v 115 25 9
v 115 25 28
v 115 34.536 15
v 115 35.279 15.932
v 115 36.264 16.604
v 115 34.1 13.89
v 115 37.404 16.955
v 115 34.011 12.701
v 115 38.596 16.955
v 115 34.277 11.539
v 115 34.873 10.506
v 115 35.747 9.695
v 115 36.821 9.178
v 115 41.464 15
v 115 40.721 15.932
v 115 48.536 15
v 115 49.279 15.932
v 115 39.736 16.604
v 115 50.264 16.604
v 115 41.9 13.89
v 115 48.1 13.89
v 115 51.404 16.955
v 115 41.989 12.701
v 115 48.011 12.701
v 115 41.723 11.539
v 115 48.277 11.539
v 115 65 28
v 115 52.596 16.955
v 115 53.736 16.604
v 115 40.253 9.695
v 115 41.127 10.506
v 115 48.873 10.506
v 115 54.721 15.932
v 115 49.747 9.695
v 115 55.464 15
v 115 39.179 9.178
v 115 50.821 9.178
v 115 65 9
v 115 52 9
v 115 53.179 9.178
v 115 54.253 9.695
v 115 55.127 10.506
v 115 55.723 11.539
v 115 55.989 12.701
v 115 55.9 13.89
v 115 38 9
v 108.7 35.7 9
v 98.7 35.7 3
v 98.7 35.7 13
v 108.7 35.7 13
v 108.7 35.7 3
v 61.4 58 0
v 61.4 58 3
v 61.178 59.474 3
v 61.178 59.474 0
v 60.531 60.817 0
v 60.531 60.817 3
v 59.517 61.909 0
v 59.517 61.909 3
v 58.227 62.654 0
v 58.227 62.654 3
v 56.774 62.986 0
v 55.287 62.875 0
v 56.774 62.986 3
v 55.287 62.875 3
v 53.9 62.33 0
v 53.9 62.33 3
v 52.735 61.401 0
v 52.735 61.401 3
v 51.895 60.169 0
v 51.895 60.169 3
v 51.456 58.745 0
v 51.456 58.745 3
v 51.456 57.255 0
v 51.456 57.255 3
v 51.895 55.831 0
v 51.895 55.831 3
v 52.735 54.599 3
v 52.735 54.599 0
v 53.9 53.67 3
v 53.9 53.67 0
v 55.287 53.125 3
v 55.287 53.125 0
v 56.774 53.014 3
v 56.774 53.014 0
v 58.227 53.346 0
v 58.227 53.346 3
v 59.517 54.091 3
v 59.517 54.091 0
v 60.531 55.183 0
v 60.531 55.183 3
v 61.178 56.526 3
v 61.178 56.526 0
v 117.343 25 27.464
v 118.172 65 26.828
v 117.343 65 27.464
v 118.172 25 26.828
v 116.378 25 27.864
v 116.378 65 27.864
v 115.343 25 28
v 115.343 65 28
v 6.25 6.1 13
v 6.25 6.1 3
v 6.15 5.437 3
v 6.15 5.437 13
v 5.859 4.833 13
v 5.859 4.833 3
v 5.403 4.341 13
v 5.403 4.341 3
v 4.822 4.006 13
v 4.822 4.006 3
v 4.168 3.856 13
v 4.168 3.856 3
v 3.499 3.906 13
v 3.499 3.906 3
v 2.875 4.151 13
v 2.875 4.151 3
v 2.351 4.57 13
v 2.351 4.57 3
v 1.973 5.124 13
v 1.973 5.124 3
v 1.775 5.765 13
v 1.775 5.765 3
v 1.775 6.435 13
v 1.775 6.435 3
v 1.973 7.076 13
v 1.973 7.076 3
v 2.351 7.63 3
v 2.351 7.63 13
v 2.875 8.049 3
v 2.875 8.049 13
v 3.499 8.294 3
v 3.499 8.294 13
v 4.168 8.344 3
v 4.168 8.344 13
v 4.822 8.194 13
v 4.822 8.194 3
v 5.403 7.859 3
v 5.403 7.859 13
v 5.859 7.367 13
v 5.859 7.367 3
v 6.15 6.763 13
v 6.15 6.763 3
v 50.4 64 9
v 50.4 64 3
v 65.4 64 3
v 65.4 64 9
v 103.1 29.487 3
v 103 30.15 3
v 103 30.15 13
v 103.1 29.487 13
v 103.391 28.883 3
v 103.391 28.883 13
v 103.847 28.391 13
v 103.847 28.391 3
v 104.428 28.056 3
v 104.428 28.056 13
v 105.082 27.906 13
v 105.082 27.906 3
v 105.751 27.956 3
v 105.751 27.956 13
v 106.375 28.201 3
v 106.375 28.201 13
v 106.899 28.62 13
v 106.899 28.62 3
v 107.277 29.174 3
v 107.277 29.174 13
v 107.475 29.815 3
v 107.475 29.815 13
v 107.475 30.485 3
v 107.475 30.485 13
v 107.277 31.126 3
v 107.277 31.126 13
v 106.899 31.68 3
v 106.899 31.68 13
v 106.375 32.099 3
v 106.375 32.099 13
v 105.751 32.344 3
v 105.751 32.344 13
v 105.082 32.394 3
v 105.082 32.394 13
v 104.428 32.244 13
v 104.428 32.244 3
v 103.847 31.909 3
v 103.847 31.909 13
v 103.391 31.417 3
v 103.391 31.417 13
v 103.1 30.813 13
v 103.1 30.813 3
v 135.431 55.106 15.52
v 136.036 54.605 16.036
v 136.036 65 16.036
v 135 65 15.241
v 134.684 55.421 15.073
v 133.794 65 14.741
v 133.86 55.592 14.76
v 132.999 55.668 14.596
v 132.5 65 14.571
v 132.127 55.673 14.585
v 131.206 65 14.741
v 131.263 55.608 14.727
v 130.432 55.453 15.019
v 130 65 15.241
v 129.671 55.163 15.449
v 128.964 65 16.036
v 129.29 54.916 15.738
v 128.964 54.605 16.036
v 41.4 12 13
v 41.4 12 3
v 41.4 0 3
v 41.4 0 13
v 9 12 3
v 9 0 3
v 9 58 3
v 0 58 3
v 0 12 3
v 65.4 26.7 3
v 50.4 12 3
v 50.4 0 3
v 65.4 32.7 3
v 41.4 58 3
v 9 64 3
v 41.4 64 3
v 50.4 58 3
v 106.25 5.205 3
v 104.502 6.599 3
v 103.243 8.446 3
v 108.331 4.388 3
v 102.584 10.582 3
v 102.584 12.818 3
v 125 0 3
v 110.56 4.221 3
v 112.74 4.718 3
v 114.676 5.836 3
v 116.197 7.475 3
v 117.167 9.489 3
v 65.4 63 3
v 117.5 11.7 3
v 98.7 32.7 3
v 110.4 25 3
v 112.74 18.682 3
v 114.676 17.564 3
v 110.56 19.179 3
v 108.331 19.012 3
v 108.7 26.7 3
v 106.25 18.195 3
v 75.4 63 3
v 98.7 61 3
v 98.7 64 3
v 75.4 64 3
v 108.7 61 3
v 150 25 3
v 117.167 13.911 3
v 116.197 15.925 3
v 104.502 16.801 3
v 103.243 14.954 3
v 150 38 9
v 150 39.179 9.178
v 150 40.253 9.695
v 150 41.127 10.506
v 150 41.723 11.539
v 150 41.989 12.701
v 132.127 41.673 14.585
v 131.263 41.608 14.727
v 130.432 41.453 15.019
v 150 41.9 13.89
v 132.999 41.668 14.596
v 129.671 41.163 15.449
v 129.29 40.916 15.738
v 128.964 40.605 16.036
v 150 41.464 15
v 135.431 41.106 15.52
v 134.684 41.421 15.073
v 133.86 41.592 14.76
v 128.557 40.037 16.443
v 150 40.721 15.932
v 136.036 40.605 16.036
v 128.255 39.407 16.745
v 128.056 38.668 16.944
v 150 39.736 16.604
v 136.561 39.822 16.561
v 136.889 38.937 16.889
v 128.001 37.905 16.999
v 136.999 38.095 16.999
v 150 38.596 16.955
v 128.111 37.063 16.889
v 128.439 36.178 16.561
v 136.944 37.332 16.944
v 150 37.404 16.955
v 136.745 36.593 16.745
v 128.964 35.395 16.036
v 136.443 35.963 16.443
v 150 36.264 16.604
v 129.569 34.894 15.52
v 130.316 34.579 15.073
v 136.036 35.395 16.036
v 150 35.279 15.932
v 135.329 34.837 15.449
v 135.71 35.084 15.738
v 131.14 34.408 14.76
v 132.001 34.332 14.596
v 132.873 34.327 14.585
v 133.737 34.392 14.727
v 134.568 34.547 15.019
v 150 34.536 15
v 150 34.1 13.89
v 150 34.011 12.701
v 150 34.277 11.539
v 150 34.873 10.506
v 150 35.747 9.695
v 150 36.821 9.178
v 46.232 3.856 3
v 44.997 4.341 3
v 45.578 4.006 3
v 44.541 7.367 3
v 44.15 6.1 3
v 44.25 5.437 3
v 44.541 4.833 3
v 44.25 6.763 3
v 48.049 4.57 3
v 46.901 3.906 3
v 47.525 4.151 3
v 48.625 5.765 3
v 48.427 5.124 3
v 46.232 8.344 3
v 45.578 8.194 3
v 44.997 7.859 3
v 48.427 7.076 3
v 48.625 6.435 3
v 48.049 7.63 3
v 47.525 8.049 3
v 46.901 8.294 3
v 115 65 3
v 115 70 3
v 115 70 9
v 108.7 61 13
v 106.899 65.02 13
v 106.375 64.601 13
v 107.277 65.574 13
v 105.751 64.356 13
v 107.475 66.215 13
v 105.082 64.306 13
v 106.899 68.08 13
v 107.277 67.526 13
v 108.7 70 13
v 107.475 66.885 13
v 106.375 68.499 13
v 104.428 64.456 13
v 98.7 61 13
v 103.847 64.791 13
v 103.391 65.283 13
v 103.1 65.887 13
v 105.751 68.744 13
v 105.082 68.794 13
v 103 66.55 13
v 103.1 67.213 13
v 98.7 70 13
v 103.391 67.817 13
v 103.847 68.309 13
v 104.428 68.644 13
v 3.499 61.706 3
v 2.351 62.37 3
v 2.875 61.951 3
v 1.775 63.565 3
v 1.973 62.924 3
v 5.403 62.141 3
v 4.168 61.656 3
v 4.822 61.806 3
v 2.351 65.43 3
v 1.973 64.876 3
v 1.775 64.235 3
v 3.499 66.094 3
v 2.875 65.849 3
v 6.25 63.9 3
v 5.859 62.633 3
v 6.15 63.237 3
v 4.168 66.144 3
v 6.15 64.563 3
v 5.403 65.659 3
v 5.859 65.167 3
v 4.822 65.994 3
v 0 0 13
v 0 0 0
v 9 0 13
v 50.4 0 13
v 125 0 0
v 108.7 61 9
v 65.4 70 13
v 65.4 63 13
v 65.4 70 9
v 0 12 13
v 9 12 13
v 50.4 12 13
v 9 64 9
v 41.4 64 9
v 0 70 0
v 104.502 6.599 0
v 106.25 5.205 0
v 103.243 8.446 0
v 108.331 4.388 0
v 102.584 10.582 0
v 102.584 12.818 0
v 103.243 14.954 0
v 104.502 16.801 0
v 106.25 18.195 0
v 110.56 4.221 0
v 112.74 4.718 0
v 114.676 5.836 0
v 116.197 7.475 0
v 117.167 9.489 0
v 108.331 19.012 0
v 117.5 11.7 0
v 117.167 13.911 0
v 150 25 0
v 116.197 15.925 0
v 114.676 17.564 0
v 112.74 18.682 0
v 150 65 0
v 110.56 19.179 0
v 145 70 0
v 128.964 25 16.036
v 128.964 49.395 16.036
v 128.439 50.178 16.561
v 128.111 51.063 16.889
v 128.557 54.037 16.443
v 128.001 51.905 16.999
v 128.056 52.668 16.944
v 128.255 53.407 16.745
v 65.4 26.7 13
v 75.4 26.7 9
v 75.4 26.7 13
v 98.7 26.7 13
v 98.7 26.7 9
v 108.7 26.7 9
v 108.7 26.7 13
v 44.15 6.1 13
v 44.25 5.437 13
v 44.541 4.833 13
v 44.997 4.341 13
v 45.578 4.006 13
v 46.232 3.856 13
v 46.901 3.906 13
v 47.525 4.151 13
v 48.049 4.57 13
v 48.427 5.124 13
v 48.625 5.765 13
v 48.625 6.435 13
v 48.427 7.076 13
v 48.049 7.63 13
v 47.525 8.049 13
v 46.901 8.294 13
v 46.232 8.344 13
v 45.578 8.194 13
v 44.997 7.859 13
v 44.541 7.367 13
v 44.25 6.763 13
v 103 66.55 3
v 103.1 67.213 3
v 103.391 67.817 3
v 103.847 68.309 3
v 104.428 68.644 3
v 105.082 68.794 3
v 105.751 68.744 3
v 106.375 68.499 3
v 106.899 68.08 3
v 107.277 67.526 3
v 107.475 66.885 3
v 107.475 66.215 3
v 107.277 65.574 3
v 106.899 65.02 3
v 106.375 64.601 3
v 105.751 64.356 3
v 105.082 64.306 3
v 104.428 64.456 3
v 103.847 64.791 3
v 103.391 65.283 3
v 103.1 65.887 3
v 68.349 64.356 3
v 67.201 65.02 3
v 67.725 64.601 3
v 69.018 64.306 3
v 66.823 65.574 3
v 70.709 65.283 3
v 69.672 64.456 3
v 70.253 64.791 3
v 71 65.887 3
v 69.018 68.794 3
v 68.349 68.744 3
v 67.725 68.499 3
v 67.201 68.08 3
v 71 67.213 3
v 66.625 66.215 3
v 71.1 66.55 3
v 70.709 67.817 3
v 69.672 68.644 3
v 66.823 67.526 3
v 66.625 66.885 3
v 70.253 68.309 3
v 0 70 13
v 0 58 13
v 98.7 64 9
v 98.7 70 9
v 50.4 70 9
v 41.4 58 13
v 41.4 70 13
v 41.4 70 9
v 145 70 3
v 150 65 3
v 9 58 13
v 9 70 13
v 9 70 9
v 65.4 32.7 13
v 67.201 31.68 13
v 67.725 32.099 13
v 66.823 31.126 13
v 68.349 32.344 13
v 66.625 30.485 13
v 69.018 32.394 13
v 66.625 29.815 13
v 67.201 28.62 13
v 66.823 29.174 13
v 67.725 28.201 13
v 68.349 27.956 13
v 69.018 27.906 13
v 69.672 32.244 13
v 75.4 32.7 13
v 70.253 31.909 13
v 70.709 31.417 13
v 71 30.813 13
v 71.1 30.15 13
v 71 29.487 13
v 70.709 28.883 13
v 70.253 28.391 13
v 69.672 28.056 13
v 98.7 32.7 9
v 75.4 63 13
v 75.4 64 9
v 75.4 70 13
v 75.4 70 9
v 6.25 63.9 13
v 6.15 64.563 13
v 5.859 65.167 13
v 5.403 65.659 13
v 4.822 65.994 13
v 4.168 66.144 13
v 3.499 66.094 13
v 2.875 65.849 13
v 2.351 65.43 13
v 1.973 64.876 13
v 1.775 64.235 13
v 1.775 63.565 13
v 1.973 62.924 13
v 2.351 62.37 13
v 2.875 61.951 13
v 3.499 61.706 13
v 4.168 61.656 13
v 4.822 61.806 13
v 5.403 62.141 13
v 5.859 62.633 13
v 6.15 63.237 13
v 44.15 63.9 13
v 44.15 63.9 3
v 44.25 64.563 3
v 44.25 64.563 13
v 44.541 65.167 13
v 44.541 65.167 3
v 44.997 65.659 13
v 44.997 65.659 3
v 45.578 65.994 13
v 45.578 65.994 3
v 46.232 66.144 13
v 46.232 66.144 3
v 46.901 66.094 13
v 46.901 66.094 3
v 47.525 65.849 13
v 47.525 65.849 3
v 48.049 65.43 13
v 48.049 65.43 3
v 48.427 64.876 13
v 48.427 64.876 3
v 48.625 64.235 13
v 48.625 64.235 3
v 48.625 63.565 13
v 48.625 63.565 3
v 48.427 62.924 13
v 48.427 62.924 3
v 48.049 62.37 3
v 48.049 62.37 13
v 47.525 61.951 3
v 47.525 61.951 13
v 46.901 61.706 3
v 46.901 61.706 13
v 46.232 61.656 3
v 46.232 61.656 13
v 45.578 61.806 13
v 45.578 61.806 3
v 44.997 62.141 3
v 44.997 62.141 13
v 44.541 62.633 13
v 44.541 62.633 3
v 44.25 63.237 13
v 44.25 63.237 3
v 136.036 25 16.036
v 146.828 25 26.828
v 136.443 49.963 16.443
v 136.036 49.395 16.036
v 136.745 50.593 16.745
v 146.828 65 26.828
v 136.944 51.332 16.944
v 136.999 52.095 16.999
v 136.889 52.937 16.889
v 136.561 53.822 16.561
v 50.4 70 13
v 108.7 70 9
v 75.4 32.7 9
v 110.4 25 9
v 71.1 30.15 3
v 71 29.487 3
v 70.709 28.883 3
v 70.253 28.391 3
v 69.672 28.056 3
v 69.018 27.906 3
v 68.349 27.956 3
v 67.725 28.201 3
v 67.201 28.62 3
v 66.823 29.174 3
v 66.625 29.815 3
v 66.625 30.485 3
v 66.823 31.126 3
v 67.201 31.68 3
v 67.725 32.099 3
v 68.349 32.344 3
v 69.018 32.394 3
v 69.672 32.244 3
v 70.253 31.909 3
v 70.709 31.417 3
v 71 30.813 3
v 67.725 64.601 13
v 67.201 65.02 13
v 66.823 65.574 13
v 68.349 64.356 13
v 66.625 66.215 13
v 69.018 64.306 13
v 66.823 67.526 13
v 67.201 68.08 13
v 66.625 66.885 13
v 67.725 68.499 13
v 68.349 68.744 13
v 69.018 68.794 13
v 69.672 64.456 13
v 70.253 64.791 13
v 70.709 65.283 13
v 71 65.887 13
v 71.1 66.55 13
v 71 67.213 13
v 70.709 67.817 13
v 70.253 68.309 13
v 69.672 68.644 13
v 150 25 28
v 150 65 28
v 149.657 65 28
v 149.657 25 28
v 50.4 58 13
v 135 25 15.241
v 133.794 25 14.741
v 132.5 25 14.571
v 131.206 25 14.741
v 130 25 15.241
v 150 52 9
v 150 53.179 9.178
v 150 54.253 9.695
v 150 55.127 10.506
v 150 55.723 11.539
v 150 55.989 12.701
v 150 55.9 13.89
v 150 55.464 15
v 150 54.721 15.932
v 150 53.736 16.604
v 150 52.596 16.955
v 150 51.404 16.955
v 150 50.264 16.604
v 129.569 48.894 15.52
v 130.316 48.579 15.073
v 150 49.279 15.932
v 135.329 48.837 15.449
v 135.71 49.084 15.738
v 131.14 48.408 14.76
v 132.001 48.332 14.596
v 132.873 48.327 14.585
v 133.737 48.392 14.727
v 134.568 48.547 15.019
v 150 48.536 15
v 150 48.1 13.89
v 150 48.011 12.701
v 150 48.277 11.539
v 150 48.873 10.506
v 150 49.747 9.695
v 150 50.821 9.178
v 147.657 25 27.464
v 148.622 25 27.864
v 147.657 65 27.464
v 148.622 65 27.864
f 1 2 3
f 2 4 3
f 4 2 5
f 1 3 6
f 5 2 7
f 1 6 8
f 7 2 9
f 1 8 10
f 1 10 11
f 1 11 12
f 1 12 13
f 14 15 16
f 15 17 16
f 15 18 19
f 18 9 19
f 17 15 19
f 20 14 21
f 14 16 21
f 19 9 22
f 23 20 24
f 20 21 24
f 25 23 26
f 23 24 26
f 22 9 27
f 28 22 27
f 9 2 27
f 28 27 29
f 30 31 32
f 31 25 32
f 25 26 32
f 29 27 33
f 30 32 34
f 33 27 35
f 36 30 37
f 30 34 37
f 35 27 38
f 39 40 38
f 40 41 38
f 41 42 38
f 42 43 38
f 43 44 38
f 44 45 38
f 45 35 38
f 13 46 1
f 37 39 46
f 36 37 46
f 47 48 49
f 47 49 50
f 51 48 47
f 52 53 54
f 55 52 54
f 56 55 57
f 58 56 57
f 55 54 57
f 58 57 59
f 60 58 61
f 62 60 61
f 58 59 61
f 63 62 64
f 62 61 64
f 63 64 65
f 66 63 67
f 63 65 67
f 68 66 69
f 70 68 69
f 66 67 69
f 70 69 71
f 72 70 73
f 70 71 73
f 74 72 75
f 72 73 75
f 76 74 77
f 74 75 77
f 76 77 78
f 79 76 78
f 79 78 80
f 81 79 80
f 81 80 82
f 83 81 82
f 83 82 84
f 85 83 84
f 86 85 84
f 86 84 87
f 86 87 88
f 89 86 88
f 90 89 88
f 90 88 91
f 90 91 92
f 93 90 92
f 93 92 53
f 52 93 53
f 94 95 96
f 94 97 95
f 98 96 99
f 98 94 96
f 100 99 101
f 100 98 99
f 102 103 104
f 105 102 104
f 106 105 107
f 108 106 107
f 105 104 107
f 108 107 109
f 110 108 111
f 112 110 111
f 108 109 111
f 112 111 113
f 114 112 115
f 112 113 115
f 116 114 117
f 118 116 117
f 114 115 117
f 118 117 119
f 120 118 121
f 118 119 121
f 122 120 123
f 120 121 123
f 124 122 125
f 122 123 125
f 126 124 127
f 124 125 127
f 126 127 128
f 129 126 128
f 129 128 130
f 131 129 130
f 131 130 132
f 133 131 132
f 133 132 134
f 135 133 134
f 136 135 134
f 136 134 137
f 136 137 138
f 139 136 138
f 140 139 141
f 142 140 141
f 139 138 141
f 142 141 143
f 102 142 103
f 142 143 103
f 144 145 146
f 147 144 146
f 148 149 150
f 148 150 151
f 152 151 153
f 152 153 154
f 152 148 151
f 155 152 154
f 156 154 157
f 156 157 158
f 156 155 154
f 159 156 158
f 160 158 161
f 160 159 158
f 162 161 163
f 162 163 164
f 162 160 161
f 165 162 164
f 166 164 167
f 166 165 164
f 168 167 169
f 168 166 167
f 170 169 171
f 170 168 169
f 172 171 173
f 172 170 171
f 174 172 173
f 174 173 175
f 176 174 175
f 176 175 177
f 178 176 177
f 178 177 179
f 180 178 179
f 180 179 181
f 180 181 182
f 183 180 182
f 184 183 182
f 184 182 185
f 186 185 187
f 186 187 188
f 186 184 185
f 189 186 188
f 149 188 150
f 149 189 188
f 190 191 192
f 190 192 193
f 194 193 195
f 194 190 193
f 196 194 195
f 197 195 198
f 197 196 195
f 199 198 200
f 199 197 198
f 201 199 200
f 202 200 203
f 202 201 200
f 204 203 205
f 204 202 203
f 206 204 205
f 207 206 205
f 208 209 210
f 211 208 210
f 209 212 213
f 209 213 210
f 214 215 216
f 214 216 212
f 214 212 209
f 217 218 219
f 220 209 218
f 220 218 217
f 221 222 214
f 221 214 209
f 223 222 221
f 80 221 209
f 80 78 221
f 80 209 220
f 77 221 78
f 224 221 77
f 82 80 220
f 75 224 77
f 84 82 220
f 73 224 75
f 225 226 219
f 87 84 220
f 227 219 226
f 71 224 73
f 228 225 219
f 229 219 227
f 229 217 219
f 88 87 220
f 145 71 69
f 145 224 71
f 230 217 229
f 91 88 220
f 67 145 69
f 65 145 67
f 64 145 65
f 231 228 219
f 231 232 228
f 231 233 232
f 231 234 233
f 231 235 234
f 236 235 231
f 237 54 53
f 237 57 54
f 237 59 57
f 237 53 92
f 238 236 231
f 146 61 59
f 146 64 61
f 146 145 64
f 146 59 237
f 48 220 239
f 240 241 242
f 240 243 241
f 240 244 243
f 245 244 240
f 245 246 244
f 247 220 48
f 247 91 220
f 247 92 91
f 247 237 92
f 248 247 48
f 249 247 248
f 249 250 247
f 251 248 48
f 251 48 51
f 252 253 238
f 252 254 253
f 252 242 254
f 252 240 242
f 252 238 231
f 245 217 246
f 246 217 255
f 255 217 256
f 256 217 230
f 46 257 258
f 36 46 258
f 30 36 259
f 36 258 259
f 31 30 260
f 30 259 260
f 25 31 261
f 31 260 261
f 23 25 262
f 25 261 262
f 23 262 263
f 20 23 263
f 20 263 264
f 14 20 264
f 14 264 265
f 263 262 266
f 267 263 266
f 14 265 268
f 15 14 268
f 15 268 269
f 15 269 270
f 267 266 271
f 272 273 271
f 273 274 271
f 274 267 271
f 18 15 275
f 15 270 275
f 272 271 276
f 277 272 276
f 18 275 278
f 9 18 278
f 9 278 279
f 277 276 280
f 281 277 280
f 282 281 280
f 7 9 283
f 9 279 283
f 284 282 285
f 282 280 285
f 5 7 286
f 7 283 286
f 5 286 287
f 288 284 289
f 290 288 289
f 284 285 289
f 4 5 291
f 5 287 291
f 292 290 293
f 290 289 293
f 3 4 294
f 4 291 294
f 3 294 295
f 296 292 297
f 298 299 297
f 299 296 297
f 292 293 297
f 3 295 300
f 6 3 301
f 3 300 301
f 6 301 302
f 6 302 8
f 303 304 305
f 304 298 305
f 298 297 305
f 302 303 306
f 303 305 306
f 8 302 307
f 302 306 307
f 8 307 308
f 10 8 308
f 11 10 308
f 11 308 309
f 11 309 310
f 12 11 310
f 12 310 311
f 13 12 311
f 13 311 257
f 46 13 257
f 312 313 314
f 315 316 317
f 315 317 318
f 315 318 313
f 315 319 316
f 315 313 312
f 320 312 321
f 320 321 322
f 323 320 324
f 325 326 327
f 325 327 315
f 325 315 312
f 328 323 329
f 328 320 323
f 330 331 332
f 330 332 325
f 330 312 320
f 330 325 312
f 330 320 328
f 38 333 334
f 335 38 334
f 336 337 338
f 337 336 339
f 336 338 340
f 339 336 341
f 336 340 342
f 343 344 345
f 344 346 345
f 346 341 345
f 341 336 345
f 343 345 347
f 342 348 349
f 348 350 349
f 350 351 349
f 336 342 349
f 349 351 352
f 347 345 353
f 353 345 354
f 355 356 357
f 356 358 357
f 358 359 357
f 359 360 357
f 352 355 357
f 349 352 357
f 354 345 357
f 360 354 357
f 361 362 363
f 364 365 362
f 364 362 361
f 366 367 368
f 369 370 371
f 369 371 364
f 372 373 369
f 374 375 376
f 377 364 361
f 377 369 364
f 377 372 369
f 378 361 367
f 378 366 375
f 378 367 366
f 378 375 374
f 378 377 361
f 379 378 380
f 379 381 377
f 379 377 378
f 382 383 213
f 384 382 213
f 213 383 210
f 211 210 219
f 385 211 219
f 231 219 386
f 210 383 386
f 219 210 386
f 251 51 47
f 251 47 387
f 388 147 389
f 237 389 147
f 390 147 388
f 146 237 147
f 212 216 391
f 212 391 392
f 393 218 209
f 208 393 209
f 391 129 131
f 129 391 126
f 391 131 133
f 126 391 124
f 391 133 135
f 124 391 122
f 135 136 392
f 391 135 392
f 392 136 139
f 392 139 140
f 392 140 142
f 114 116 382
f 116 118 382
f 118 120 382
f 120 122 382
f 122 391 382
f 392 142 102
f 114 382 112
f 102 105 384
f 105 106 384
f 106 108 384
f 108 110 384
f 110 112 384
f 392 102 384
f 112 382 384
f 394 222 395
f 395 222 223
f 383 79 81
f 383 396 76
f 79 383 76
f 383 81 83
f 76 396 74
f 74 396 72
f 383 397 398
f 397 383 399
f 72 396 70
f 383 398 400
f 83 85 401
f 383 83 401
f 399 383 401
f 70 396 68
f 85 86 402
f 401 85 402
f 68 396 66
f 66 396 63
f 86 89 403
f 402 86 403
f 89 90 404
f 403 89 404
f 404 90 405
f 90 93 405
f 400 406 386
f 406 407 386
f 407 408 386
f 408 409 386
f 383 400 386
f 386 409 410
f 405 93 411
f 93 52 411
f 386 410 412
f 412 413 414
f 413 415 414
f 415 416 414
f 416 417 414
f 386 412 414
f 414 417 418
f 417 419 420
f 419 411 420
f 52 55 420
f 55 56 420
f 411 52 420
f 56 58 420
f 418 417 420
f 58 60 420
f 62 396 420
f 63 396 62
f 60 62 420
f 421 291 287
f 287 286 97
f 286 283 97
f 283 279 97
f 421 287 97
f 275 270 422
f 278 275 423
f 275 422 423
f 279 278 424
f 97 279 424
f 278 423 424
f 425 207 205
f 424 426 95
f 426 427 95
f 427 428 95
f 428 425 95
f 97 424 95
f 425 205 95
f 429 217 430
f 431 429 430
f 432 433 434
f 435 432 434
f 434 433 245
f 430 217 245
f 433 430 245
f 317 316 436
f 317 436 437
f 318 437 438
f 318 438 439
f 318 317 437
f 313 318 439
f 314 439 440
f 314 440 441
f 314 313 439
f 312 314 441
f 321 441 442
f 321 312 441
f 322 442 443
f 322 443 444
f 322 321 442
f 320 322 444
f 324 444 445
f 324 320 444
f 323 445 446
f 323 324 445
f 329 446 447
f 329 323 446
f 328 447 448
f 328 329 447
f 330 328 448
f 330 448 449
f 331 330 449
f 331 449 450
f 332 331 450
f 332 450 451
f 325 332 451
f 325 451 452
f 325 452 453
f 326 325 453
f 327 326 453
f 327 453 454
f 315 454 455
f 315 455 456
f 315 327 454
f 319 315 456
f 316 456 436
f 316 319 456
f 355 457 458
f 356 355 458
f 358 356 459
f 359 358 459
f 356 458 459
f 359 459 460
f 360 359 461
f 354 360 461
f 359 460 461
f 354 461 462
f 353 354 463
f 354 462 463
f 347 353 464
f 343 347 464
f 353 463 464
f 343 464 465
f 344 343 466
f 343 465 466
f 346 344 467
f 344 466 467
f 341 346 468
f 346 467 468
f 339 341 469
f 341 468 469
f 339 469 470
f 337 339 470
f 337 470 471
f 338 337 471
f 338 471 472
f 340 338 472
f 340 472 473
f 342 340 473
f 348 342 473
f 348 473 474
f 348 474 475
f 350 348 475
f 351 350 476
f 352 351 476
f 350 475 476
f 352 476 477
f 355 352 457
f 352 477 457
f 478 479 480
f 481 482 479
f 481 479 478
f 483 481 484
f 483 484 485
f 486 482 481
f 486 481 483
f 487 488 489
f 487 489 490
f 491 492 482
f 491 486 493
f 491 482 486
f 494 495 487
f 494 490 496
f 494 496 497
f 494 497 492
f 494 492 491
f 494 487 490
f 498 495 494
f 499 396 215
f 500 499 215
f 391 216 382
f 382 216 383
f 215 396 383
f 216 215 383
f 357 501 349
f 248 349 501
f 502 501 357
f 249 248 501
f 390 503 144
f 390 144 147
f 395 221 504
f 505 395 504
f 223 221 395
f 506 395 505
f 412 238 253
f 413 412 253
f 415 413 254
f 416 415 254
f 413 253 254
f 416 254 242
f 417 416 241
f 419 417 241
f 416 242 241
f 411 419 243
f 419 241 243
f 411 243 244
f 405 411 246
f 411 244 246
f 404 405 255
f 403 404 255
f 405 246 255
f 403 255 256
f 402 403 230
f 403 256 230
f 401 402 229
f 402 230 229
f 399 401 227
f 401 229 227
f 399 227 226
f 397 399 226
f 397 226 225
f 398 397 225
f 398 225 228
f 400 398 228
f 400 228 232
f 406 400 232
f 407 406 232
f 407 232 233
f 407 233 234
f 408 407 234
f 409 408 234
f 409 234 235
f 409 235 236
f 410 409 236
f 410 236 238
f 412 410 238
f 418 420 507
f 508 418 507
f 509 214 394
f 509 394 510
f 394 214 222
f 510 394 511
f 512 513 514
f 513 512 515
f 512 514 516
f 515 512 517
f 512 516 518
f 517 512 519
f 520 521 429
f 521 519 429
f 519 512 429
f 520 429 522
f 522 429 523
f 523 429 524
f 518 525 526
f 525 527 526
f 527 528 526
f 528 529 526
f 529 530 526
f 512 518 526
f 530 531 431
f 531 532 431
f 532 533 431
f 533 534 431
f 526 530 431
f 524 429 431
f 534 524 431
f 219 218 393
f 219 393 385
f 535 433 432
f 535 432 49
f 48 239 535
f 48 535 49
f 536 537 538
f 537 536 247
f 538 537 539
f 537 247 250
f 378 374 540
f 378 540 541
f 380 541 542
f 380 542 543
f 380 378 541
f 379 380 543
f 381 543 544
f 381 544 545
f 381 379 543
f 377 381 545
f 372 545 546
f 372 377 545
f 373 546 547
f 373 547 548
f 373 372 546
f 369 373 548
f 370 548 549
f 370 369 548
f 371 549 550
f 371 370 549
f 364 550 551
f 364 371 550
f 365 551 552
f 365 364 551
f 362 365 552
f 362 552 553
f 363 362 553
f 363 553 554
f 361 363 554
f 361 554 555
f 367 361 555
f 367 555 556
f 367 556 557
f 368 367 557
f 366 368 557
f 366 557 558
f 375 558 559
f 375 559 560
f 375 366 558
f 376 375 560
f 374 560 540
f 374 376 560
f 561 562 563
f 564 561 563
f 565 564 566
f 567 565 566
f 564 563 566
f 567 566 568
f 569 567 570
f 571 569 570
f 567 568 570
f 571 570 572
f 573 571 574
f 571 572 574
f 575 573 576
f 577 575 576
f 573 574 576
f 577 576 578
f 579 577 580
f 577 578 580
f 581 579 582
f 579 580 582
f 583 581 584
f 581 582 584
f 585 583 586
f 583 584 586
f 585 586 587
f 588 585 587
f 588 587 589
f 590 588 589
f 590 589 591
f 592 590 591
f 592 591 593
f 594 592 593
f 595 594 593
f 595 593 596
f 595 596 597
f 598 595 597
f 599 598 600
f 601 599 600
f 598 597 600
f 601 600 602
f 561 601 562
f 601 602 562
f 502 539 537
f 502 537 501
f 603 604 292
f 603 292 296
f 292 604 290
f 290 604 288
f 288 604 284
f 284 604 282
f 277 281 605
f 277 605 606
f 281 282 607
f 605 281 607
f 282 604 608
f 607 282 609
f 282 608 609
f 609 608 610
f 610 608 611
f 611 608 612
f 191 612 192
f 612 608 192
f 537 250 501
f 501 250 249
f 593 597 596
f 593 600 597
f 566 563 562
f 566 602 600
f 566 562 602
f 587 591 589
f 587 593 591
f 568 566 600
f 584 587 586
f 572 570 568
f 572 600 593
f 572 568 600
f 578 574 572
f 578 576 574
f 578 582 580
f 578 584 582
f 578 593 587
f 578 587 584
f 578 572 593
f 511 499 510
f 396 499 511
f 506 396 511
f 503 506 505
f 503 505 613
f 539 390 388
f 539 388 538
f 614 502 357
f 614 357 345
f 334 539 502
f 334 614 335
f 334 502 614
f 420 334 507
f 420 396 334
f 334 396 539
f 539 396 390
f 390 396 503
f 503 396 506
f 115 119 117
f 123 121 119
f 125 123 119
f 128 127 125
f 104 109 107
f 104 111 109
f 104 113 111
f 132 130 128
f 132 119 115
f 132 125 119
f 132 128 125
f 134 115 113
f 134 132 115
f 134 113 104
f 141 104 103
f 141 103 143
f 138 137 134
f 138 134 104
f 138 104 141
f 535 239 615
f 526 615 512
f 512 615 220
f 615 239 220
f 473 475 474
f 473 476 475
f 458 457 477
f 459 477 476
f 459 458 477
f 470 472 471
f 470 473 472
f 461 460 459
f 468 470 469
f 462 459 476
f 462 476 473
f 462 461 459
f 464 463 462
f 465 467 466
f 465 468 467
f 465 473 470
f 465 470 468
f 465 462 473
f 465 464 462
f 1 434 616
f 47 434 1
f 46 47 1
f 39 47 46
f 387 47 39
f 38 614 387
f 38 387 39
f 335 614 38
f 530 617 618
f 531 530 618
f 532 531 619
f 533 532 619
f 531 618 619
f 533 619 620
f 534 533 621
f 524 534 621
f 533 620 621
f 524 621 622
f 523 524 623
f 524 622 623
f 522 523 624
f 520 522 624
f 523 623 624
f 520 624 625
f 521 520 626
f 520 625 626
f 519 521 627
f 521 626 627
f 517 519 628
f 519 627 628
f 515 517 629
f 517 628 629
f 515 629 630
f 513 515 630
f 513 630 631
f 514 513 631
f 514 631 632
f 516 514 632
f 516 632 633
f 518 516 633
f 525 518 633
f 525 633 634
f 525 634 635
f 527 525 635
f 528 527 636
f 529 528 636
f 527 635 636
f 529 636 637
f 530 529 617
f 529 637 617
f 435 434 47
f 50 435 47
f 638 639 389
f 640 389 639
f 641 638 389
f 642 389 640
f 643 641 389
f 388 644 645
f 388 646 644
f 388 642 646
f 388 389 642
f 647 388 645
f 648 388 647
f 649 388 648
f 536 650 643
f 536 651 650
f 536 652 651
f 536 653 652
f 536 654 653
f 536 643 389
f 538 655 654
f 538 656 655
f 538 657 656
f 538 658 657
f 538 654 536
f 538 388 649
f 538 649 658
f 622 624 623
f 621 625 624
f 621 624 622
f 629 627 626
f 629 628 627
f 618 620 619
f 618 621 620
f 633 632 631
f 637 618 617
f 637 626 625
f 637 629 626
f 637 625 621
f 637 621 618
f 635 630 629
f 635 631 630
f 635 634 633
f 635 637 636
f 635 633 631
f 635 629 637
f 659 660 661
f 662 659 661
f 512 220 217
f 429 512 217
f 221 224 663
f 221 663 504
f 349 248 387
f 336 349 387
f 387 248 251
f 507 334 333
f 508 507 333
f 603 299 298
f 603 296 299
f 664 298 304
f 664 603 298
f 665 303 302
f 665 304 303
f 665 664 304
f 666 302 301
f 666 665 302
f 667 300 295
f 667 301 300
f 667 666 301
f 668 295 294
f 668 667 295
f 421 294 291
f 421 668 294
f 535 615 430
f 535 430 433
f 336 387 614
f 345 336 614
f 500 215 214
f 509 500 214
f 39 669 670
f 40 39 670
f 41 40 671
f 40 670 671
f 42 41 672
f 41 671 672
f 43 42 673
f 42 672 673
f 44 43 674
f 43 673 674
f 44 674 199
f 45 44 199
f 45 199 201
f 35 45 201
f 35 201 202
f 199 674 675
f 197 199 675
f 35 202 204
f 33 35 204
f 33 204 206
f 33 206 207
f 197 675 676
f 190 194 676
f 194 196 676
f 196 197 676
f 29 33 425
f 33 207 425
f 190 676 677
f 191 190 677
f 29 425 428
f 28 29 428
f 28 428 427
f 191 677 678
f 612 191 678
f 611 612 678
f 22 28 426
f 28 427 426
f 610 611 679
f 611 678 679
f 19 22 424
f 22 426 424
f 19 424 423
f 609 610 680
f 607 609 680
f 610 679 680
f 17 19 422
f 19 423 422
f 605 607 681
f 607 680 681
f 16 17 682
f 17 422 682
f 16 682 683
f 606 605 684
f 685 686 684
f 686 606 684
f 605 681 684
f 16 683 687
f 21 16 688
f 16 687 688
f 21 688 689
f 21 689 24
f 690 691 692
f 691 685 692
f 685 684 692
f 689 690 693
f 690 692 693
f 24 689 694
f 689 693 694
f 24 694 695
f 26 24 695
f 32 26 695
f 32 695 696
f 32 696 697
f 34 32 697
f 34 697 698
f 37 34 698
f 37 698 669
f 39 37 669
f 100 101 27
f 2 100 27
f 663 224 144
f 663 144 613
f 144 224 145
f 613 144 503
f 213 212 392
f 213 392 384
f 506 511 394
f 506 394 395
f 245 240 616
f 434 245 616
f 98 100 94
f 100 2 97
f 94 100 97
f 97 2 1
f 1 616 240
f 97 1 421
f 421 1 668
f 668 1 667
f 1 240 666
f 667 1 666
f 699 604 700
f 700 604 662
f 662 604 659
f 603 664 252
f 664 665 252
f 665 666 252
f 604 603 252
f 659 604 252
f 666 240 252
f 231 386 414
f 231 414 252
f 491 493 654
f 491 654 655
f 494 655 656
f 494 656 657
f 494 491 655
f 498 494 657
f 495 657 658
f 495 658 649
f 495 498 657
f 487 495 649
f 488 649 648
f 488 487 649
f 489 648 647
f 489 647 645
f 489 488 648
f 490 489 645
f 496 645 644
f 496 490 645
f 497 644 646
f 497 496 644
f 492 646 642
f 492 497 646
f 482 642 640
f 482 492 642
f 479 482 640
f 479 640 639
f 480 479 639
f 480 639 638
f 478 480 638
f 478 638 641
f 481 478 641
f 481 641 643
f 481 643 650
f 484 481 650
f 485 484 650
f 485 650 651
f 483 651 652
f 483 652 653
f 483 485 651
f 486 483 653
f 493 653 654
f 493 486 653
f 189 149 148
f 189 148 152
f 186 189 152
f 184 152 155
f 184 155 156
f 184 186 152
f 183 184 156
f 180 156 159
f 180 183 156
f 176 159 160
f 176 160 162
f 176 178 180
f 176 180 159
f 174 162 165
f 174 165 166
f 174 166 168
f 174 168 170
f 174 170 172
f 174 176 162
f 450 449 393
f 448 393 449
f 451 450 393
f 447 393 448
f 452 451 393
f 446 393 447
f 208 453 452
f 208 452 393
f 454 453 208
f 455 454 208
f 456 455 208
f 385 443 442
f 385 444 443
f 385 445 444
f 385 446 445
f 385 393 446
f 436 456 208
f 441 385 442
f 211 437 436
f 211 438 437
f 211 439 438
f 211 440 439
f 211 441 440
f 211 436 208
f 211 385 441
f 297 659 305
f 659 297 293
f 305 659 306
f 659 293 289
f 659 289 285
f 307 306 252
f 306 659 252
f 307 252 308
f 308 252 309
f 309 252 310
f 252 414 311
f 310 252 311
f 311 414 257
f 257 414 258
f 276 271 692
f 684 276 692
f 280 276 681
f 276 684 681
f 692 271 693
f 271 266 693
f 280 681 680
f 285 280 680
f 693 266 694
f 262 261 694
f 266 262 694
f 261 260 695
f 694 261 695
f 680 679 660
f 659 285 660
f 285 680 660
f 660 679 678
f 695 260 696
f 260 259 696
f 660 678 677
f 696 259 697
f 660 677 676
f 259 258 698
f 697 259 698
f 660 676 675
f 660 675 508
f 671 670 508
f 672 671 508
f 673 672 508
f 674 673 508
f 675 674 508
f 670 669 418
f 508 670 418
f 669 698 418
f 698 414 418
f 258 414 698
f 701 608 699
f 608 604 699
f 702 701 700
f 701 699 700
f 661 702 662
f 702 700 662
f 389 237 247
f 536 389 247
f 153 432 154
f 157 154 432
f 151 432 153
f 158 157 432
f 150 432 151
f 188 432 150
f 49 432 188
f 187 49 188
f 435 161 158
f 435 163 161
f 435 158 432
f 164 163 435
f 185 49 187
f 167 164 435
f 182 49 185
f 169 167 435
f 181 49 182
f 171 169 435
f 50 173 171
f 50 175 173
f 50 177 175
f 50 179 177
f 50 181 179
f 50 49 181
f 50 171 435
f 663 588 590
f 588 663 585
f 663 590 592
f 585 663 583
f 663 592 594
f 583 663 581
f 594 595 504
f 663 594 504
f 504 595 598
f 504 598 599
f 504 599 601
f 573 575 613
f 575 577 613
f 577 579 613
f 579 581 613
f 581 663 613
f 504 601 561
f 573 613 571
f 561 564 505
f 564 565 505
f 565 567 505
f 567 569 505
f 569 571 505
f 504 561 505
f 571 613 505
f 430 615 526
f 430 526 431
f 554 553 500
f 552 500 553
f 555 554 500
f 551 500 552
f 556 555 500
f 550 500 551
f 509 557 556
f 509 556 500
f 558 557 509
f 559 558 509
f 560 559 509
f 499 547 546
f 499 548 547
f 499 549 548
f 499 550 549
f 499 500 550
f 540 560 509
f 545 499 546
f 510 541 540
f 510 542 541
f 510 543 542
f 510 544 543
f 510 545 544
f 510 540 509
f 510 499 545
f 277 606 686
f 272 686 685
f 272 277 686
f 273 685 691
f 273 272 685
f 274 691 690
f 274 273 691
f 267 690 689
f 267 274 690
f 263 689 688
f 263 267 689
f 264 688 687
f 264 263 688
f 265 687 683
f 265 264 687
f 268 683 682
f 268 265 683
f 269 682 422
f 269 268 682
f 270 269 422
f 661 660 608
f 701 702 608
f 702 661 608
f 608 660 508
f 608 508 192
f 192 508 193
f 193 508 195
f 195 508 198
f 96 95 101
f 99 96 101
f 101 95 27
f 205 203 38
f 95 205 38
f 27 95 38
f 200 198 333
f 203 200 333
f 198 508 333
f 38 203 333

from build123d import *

# Parameters (mm, degrees)
ESQUISSE1_W               = 150
ESQUISSE1_H               = 70
BOSS_EXTRU_1_DEPTH        = 3
ESQUISSE2_W               = 9
ESQUISSE2_H               = 12
ESQUISSE2_R               = 2.25
BOSS_EXTRU_2_DEPTH        = 10
SYM_TRIE2_COPY_1_SKETCH_W = 9
SYM_TRIE2_COPY_1_SKETCH_H = 12
SYM_TRIE2_COPY_1_SKETCH_R = 2.25
SYM_TRIE2_COPY_1_DEPTH    = 10
ESQUISSE3_W               = 10
ESQUISSE3_H               = 6
ESQUISSE3_R               = 2.25
BOSS_EXTRU_3_DEPTH        = 10
SYM_TRIE4_COPY_1_SKETCH_W = 10
SYM_TRIE4_COPY_1_SKETCH_H = 6
SYM_TRIE4_COPY_1_SKETCH_R = 2.25
SYM_TRIE4_COPY_1_DEPTH    = 10
BOSS_EXTRU_4_DEPTH        = 10
BOSS_EXTRU_4_DEPTH_BACK   = 30
CONG_1_R                  = 5
CONG_2_R                  = 4
ENL_V_MAT_EXTRU_1_REACH   = 169.881
ESQUISSE5_R               = 4
ESQUISSE6_W               = 23.3
ESQUISSE6_H               = 6
ESQUISSE6_W_2             = 6.3
ESQUISSE6_H_2             = 45
BOSS_EXTRU_5_DEPTH        = 6
CHANFREIN1_SIZE           = 1.7
ESQUISSE7_W               = 15
ESQUISSE7_H               = 6
ESQUISSE7_W_2             = 32.4
BOSS_EXTRU_6_DEPTH        = 6
CHANFREIN2_SIZE           = 5
CHANFREIN3_SIZE           = 25
ESQUISSE8_R               = 5
ENL_V_MAT_EXTRU_2_DEPTH   = 168.406690517
ESQUISSE9_R               = 7.5
ENL_V_MAT_EXTRU_3_DEPTH   = 168.406690517
ESQUISSE10_W              = 10
ESQUISSE10_H              = 1
ESQUISSE10_H_2            = 3
BOSS_EXTRU_7_DEPTH        = 10


with BuildPart() as part:
    # Esquisse1 → Boss.-Extru.1 (new body)
    with BuildSketch(Plane.XY):
        with Locations((75, 35)):
            Rectangle(ESQUISSE1_W, ESQUISSE1_H)
    extrude(amount=BOSS_EXTRU_1_DEPTH)

    # Esquisse2 → Boss.-Extru.2 (add)
    with BuildSketch(Plane.XY.offset(3)):
        with Locations((4.5, 64)):
            Rectangle(ESQUISSE2_W, ESQUISSE2_H)
        with Locations((4, 63.9)):
            Circle(ESQUISSE2_R, mode=Mode.SUBTRACT)
    boss_extru_2 = extrude(amount=BOSS_EXTRU_2_DEPTH)

    # Symétrie1: Boss.-Extru.2 across plane
    add(boss_extru_2.mirror(Plane.ZY.offset(-25.2)))

    # Symétrie2: Boss.-Extru.2 across plane
    add(boss_extru_2.mirror(Plane(origin=(0, 35, 0), x_dir=(0, 0, 1), z_dir=(0, -1, 0))))

    # Symétrie2 copy 1 sketch → Symétrie2 copy 1 (add)
    with BuildSketch(Plane(origin=(50.4, 70, 3), x_dir=(-1, 0, 0), z_dir=(0, 0, 1))):
        with Locations((4.5, 64)):
            Rectangle(SYM_TRIE2_COPY_1_SKETCH_W, SYM_TRIE2_COPY_1_SKETCH_H)
        with Locations((4, 63.9)):
            Circle(SYM_TRIE2_COPY_1_SKETCH_R, mode=Mode.SUBTRACT)
    extrude(amount=SYM_TRIE2_COPY_1_DEPTH)

    # Esquisse3 → Boss.-Extru.3 (add)
    with BuildSketch(Plane.XY.offset(3)):
        with Locations((70.4, 67)):
            Rectangle(ESQUISSE3_W, ESQUISSE3_H)
        with Locations((68.85, 66.55)):
            Circle(ESQUISSE3_R, mode=Mode.SUBTRACT)
    boss_extru_3 = extrude(amount=BOSS_EXTRU_3_DEPTH)

    # Symétrie3: Boss.-Extru.3 across plane
    add(boss_extru_3.mirror(Plane.ZY.offset(-87.05)))

    # Symétrie4: Boss.-Extru.3 across plane
    add(boss_extru_3.mirror(Plane.ZX.offset(48.35)))

    # Symétrie4 copy 1 sketch → Symétrie4 copy 1 (add)
    with BuildSketch(Plane(origin=(174.1, 96.7, 3), x_dir=(-1, 0, 0), z_dir=(0, 0, 1))):
        with Locations((70.4, 67)):
            Rectangle(SYM_TRIE4_COPY_1_SKETCH_W, SYM_TRIE4_COPY_1_SKETCH_H)
        with Locations((68.85, 66.55)):
            Circle(SYM_TRIE4_COPY_1_SKETCH_R, mode=Mode.SUBTRACT)
    extrude(amount=SYM_TRIE4_COPY_1_DEPTH)

    # Esquisse4 → Boss.-Extru.4 (add, two sides: drawn at the far end of the back side and taken through both)
    with BuildSketch(Plane(origin=(0, 35, 0), x_dir=(-1, 0, 0), z_dir=(0, -1, 0)).offset(-BOSS_EXTRU_4_DEPTH_BACK)):
        Polygon((-150, -3), (-150, -28), (-148, -28), (-132.5, -12.5), (-117, -28), (-115, -28), (-115, -3), align=None)
    extrude(amount=BOSS_EXTRU_4_DEPTH + BOSS_EXTRU_4_DEPTH_BACK)

    # Congé1
    cong_1_edges = [part.edges().sort_by_distance(p)[0] for p in [
        (132.5, 45, 12.5),
    ]]
    fillet(cong_1_edges, radius=CONG_1_R)

    # Congé2
    cong_2_edges = [part.edges().sort_by_distance(p)[0] for p in [
        (117, 45, 28),
        (148, 45, 28),
    ]]
    fillet(cong_2_edges, radius=CONG_2_R)

    # Enlèv. mat.-Extru.1: up to this face of the body (flat: up to its plane)
    enl_v_mat_extru_1_end = Plane(part.part.faces().sort_by_distance((115, 45, 15.5))[0])
    # Esquisse5 → Enlèv. mat.-Extru.1 (cut, up to the picked face)
    with BuildSketch(Plane(origin=(150, 0, 0), x_dir=(0, 0, -1), z_dir=(1, 0, 0)), mode=Mode.PRIVATE) as enl_v_mat_extru_1_sk1:
        with Locations((-13, 52)):
            Circle(ESQUISSE5_R)
    enl_v_mat_extru_1_tool1 = split(extrude(enl_v_mat_extru_1_sk1.sketch, amount=-ENL_V_MAT_EXTRU_1_REACH, mode=Mode.PRIVATE), bisect_by=enl_v_mat_extru_1_end, keep=Keep.BOTH, mode=Mode.PRIVATE)
    # Esquisse5 → Enlèv. mat.-Extru.1 (cut, up to the picked face)
    with BuildSketch(Plane(origin=(150, 0, 0), x_dir=(0, 0, -1), z_dir=(1, 0, 0)), mode=Mode.PRIVATE) as enl_v_mat_extru_1_sk2:
        with Locations((-13, 38)):
            Circle(ESQUISSE5_R)
    enl_v_mat_extru_1_tool2 = split(extrude(enl_v_mat_extru_1_sk2.sketch, amount=-ENL_V_MAT_EXTRU_1_REACH, mode=Mode.PRIVATE), bisect_by=enl_v_mat_extru_1_end, keep=Keep.BOTH, mode=Mode.PRIVATE)
    add(enl_v_mat_extru_1_tool1.solids().sort_by(Axis((150, 52, 13), (-1, 0, 0)))[0], mode=Mode.SUBTRACT)
    add(enl_v_mat_extru_1_tool2.solids().sort_by(Axis((150, 38, 13), (-1, 0, 0)))[0], mode=Mode.SUBTRACT)

    # Esquisse6 → Boss.-Extru.5 (add)
    with BuildSketch(Plane.XY.offset(3)):
        with Locations((87.05, 67)):
            Rectangle(ESQUISSE6_W, ESQUISSE6_H)
        with Locations((87.05, 29.7)):
            Rectangle(ESQUISSE6_W, ESQUISSE6_H)
        with Locations((111.85, 47.5)):
            Rectangle(ESQUISSE6_W_2, ESQUISSE6_H_2)
    extrude(amount=BOSS_EXTRU_5_DEPTH)

    # Chanfrein1
    chanfrein1_edges = [part.edges().sort_by_distance(p)[0] for p in [
        (108.7, 25, 6),
    ]]
    chamfer(chanfrein1_edges, length=CHANFREIN1_SIZE - 0.0001)  # a hair under: the kernel refuses the full size

    # Esquisse7 → Boss.-Extru.6 (add)
    with BuildSketch(Plane.XY.offset(3)):
        with Locations((57.9, 67)):
            Rectangle(ESQUISSE7_W, ESQUISSE7_H)
        with Locations((25.2, 67)):
            Rectangle(ESQUISSE7_W_2, ESQUISSE7_H)
    extrude(amount=BOSS_EXTRU_6_DEPTH)

    # Chanfrein2
    chanfrein2_edges = [part.edges().sort_by_distance(p)[0] for p in [
        (150, 70, 1.5),
    ]]
    chamfer(chanfrein2_edges, length=CHANFREIN2_SIZE)

    # Chanfrein3
    chanfrein3_edges = [part.edges().sort_by_distance(p)[0] for p in [
        (150, 0, 1.5),
    ]]
    chamfer(chanfrein3_edges, length=CHANFREIN3_SIZE)

    # Esquisse8 → Enlèv. mat.-Extru.2 (cut, through all)
    with BuildSketch(Plane.XY.offset(3)):
        with Locations((56.4, 58)):
            Circle(ESQUISSE8_R)
    extrude(amount=-ENL_V_MAT_EXTRU_2_DEPTH, mode=Mode.SUBTRACT)

    # Esquisse9 → Enlèv. mat.-Extru.3 (cut, through all)
    with BuildSketch(Plane.XY.offset(3)):
        with Locations((110, 11.7)):
            Circle(ESQUISSE9_R)
    extrude(amount=-ENL_V_MAT_EXTRU_3_DEPTH, mode=Mode.SUBTRACT)

    # Esquisse10 → Boss.-Extru.7 (add)
    with BuildSketch(Plane.XY.offset(3)):
        with Locations((70.4, 63.5)):
            Rectangle(ESQUISSE10_W, ESQUISSE10_H)
        with Locations((103.7, 62.5)):
            Rectangle(ESQUISSE10_W, ESQUISSE10_H_2)
        with Locations((103.7, 34.2)):
            Rectangle(ESQUISSE10_W, ESQUISSE10_H_2)
    extrude(amount=BOSS_EXTRU_7_DEPTH)


solid = part.part
